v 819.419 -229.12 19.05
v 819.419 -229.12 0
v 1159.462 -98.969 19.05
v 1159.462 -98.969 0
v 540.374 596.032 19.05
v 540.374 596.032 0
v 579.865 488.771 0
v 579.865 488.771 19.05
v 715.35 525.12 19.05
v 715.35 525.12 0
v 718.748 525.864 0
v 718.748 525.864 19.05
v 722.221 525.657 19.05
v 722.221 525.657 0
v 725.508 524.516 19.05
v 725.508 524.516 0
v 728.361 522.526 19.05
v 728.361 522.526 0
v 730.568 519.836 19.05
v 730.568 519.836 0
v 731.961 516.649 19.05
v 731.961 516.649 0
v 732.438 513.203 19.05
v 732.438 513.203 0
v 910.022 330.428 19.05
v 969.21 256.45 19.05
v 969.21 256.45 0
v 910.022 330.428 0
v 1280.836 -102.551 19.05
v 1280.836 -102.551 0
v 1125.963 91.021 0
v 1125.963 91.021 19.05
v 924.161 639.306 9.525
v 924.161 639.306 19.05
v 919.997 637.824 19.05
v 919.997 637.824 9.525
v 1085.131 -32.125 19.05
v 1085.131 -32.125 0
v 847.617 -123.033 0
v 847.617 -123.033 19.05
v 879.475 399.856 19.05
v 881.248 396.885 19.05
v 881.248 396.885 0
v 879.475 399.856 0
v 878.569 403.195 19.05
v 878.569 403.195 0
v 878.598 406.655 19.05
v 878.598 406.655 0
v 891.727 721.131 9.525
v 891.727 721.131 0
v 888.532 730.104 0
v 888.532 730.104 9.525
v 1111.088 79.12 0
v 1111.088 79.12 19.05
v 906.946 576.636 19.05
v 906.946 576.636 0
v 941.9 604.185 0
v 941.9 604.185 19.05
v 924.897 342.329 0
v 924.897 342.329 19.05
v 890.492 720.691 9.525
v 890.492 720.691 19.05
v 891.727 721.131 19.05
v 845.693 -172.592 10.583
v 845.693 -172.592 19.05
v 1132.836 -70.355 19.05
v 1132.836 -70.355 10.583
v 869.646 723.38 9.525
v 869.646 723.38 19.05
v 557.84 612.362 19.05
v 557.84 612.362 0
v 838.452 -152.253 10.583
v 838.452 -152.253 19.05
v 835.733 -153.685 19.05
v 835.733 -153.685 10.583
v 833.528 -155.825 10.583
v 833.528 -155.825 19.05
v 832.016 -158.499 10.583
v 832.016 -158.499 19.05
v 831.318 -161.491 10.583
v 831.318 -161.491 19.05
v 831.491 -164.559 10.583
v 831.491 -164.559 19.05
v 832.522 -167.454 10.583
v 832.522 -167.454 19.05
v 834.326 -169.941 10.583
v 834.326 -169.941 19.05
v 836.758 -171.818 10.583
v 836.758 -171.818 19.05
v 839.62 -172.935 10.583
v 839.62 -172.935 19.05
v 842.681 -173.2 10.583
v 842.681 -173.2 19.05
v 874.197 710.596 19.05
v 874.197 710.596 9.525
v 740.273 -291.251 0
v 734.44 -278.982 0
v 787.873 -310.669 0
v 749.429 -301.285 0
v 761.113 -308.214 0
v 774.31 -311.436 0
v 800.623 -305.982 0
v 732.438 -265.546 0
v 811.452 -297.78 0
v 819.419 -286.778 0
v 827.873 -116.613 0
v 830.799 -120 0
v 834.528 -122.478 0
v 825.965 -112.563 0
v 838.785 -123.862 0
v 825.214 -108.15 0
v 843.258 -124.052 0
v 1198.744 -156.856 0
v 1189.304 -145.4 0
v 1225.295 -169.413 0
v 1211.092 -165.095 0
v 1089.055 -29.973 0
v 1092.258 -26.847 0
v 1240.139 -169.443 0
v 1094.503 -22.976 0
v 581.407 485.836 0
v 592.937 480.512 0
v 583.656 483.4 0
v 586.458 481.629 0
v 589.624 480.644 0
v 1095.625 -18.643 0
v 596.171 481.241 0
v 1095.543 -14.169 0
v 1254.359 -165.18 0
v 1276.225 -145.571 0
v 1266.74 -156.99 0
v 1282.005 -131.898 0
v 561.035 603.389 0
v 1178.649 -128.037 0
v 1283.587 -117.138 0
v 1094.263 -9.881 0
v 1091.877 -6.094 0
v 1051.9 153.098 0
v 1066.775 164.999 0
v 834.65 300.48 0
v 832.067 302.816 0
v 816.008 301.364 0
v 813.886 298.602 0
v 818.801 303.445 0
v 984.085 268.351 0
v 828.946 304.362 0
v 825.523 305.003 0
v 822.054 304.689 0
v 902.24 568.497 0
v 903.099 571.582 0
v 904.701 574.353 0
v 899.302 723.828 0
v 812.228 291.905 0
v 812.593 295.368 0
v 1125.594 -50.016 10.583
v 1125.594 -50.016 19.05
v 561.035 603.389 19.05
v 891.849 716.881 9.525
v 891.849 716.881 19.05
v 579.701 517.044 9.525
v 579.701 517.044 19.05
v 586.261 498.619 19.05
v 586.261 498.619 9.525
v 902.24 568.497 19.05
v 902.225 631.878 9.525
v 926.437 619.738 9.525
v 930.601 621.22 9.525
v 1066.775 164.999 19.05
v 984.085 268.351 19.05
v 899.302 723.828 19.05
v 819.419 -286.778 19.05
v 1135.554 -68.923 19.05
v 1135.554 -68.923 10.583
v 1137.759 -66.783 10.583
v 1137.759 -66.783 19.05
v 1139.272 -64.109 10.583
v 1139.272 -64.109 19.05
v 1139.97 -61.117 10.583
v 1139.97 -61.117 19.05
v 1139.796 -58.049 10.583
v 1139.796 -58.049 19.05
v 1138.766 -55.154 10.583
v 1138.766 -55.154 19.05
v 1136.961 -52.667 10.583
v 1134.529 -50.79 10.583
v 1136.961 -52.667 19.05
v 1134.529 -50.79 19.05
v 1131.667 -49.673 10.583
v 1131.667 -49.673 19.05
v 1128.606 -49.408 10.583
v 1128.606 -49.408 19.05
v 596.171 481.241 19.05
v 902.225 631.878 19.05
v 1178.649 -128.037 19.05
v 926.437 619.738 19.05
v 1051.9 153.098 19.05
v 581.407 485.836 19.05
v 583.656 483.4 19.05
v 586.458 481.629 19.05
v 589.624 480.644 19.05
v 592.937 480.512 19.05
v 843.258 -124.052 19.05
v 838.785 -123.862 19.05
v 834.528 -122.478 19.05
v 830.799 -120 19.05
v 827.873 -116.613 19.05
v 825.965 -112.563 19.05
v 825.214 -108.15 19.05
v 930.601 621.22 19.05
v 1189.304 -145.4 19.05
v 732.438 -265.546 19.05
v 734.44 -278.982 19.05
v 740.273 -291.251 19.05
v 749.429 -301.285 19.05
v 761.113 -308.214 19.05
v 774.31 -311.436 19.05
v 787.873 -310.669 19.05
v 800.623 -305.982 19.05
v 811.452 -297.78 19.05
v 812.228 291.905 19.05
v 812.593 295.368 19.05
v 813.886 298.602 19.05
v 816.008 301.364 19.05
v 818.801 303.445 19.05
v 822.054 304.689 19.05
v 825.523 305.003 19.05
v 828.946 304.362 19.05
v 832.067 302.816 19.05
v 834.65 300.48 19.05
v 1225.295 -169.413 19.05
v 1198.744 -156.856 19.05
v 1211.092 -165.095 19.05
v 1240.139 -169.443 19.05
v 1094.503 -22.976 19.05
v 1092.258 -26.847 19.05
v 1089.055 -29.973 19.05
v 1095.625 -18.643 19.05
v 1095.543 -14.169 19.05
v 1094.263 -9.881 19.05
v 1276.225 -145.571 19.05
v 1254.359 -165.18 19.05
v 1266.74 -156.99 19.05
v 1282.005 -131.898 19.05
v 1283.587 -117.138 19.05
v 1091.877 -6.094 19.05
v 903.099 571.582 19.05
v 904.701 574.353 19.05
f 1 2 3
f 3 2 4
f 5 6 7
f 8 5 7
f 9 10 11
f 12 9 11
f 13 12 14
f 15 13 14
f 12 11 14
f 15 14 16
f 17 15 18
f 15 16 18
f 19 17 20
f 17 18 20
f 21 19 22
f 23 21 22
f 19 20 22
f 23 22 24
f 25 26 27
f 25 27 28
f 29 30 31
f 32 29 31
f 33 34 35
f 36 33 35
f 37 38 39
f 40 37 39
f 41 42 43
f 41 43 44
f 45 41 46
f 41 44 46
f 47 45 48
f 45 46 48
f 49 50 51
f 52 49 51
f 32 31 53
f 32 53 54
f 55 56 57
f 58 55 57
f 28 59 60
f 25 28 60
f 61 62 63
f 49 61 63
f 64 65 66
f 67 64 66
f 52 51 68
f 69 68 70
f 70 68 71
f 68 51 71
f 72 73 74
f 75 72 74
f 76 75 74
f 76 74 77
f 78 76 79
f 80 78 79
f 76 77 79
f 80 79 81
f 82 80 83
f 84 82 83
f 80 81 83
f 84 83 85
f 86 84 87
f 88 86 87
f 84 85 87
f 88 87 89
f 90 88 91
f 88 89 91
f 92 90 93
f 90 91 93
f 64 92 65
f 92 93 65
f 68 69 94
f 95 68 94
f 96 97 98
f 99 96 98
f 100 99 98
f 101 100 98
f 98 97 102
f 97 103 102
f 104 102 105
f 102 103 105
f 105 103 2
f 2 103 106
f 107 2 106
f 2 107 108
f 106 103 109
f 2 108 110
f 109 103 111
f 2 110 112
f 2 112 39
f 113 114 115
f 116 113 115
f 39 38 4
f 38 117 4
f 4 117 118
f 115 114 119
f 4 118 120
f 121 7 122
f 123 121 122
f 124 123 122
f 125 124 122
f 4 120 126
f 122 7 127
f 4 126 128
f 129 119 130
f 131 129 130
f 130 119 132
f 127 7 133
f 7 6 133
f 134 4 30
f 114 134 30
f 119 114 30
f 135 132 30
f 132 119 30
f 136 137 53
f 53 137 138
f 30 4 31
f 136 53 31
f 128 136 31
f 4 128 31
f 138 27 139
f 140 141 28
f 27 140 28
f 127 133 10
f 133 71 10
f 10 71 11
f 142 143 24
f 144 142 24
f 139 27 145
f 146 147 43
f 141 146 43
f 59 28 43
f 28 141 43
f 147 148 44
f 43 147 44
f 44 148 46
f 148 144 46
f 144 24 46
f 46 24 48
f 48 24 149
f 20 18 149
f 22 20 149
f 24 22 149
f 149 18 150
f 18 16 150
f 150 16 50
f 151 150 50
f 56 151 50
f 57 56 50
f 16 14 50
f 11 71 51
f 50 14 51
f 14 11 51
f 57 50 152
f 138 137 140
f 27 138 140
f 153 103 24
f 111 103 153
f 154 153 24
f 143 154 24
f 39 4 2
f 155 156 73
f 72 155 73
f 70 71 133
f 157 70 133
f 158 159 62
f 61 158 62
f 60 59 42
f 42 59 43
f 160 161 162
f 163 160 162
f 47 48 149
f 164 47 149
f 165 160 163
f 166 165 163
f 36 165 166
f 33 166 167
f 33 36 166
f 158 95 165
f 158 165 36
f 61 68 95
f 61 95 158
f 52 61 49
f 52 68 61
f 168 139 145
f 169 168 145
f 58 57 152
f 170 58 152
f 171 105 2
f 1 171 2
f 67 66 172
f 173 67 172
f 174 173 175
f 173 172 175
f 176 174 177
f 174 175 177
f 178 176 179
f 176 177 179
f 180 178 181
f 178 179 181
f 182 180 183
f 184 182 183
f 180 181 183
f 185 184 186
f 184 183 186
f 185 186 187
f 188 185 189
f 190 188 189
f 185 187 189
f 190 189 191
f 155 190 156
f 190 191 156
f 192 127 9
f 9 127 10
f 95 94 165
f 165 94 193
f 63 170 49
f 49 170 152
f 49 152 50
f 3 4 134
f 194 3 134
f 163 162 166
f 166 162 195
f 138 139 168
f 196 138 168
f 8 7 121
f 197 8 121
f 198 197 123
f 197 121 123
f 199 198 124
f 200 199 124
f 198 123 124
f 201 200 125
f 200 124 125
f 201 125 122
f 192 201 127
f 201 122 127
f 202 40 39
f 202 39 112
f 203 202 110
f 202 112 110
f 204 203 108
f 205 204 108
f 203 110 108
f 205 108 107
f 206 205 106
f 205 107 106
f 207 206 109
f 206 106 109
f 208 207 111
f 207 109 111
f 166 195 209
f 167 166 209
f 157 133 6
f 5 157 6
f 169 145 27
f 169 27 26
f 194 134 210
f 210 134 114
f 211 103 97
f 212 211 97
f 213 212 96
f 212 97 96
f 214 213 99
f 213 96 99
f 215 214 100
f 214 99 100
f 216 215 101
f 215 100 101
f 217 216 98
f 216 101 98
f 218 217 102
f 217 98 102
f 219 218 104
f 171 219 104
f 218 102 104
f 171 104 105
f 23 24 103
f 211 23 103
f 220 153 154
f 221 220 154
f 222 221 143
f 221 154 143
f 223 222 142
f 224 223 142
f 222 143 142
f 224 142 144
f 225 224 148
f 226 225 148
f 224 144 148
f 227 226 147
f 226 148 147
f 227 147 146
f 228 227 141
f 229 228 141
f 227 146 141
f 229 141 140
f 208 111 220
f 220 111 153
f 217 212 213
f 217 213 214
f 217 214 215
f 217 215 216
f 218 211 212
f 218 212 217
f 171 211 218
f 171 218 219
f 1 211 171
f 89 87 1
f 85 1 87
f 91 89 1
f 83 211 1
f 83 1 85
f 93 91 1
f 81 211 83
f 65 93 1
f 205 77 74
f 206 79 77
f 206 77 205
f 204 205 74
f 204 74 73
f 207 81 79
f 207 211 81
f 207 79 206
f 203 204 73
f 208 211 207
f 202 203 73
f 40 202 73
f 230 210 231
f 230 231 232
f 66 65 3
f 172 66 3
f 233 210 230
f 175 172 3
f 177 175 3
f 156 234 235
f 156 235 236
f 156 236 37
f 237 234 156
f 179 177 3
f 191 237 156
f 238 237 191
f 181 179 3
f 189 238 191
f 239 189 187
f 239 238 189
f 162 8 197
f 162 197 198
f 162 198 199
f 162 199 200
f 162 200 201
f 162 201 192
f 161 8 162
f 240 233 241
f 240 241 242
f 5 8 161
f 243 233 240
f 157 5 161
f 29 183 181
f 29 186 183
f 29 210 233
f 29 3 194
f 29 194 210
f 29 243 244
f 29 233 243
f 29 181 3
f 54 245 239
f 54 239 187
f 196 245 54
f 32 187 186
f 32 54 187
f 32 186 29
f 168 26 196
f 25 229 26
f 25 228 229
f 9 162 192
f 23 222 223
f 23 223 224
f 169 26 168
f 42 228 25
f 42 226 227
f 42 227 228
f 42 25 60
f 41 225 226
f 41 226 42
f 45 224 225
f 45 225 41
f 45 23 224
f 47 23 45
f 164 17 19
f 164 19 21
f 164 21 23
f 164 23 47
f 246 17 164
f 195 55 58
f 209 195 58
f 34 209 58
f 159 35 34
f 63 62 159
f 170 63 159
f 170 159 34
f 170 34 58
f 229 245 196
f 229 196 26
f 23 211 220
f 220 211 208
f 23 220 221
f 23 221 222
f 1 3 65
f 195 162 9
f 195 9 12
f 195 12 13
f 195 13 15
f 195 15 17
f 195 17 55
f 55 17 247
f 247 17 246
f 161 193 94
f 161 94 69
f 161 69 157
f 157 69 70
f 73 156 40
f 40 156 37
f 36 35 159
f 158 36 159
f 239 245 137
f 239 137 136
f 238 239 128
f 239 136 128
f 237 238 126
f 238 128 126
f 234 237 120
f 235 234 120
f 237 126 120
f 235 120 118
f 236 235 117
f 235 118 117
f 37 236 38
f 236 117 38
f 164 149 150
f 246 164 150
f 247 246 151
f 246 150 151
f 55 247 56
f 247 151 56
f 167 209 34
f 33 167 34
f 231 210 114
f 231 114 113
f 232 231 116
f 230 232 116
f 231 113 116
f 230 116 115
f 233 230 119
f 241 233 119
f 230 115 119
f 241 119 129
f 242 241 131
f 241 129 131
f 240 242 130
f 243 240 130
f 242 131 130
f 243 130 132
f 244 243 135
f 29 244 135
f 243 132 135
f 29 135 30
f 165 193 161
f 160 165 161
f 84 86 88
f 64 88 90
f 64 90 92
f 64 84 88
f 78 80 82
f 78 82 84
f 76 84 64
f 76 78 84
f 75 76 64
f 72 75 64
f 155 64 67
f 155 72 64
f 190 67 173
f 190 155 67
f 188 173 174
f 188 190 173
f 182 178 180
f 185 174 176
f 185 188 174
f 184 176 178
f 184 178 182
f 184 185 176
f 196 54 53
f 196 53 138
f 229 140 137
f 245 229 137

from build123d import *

# Parameters (mm, degrees)
F1_DEPTH = 19.05
F3_DEPTH = 8.4666582
F5_DEPTH = 9.525
F6_W     = 94.742
F6_H     = 19.05
F7_DEPTH = 19.05


# Not quite as in the source:
# - a feature names something its author has since deleted; it is built from what else it names


with BuildPart() as f1:
    # F0 (on Top) → F1 (new body)
    with BuildSketch(Plane.XY):
        with BuildLine():
            Line((732.4377516272, 429.8118038565), (732.4377516272, -265.5463867273))
            ThreePointArc((732.4377516272, -265.5463867273), (767.5922703415, -310.3140075425), (819.4192408881, -286.7779674454))
            Line((819.4192408881, -286.7779674454), (819.4192408881, -229.1199674454))
            Line((819.4192408881, -229.1199674454), (1159.4623036636, -98.9686407408))
            Line((1159.4623036636, -98.9686407408), (1178.6487772739, -128.0367093729))
            Line((1178.6487772739, -128.0367093729), (1189.3036458742, -145.3996676047))
            ThreePointArc((1189.3036458742, -145.3996676047), (1254.3589120262, -165.180351508), (1280.8355912672, -102.5508970465))
            Line((1280.8355912672, -102.5508970465), (881.2480453078, 396.8848219998))
            ThreePointArc((881.2480453078, 396.8848219998), (878.9075846932, 401.4943033077), (878.5980767553, 406.6546597539))
            Line((878.5980767553, 406.6546597539), (902.2401524871, 568.497452094))
            ThreePointArc((902.2401524871, 568.497452094), (903.8120375637, 573.0182606597), (906.9455405898, 576.6362285378))
            Line((906.9455405898, 576.6362285378), (941.9003890149, 604.1852707886))
            Line((941.9003890149, 604.1852707886), (899.3018677789, 723.8279303566))
            Line((899.3018677789, 723.8279303566), (891.7270738587, 721.1309406639))
            Line((891.7270738587, 721.1309406639), (888.532184766, 730.1041401315))
            Line((888.532184766, 730.1041401315), (557.8398737201, 612.361827435))
            Line((557.8398737201, 612.361827435), (561.0347628128, 603.3886279674))
            Line((561.0347628128, 603.3886279674), (540.3738890749, 596.0323666485))
            Line((540.3738890749, 596.0323666485), (579.8650741531, 488.7713005475))
            ThreePointArc((579.8650741531, 488.7713005475), (586.4584656719, 481.6292642269), (596.1708798397, 481.2413137672))
            Line((596.1708798397, 481.2413137672), (715.3498421741, 525.1204082985))
            ThreePointArc((715.3498421741, 525.1204082985), (727.0028583004, 523.6192401995), (732.4377516272, 513.202512065))
            Line((732.4377516272, 513.202512065), (732.4377516272, 429.8118038565))
        make_face()
        with BuildLine():
            ThreePointArc((847.6172180507, -123.0333171416), (832.579476833, -121.3659760987), (825.2142352601, -108.1498153983))
            Line((825.2142352601, -108.1498153983), (812.2279623998, 291.9047427935))
            ThreePointArc((812.2279623998, 291.9047427935), (820.3847868922, 304.1789193457), (834.6503380579, 300.4798321914))
            Line((834.6503380579, 300.4798321914), (1091.877202569, -6.0938706764))
            ThreePointArc((1091.877202569, -6.0938706764), (1095.2114543488, -20.8476640537), (1085.1310970041, -32.1249886369))
            Line((1085.1310970041, -32.1249886369), (847.6172180507, -123.0333171416))
        make_face(mode=Mode.SUBTRACT)
    extrude(amount=F1_DEPTH)

    # F2 (on face) → F3 (cut)
    with BuildSketch(Plane.XY.offset(19.05)):
        with BuildLine():
            ThreePointArc((838.451528287, -152.2525984903), (831.9027765287, -166.0430988586), (845.6932768971, -172.5918506169))
            Line((845.6932768971, -172.5918506169), (1132.8356598603, -70.3553996504))
            ThreePointArc((1132.8356598603, -70.3553996504), (1139.3844116185, -56.564899282), (1125.5939112501, -50.0161475238))
            Line((1125.5939112501, -50.0161475238), (838.451528287, -152.2525984903))
        make_face()
    extrude(amount=-F3_DEPTH, mode=Mode.SUBTRACT)

    # F4 (on face) → F5 (cut)
    with BuildSketch(Plane.XY.offset(19.05)):
        Polygon((579.7007303012, 517.0436017545), (586.2609025716, 498.618632181), (926.4367371726, 619.7375338049), (930.6009060633, 621.2201775171), (924.161381266, 639.3062953154), (919.9972123753, 637.8236516032), (891.8491444715, 716.8806143331), (890.4923506062, 720.6913200061), (891.7270738587, 721.1309406639), (888.532184766, 730.1041401315), (869.645537074, 723.3795883228), (874.197220032, 710.5956831823), (902.2246404628, 631.8775722275), align=None)
    extrude(amount=-F5_DEPTH, mode=Mode.SUBTRACT)

    # F6 (on face) → F7 (cut)
    with BuildSketch(Plane(origin=(730.9119602838, 584.7866009261, 0), x_dir=(-0.6247321984, 0.7808390873, 0), z_dir=(0.7808390873, 0.6247321984, 0))):
        with Locations((-357.880134458, 9.525)):
            Rectangle(F6_W, F6_H)
        with Locations((-584.981534458, 9.525)):
            Rectangle(F6_W, F6_H)
    extrude(amount=-F7_DEPTH, mode=Mode.SUBTRACT)


solid = f1.part
